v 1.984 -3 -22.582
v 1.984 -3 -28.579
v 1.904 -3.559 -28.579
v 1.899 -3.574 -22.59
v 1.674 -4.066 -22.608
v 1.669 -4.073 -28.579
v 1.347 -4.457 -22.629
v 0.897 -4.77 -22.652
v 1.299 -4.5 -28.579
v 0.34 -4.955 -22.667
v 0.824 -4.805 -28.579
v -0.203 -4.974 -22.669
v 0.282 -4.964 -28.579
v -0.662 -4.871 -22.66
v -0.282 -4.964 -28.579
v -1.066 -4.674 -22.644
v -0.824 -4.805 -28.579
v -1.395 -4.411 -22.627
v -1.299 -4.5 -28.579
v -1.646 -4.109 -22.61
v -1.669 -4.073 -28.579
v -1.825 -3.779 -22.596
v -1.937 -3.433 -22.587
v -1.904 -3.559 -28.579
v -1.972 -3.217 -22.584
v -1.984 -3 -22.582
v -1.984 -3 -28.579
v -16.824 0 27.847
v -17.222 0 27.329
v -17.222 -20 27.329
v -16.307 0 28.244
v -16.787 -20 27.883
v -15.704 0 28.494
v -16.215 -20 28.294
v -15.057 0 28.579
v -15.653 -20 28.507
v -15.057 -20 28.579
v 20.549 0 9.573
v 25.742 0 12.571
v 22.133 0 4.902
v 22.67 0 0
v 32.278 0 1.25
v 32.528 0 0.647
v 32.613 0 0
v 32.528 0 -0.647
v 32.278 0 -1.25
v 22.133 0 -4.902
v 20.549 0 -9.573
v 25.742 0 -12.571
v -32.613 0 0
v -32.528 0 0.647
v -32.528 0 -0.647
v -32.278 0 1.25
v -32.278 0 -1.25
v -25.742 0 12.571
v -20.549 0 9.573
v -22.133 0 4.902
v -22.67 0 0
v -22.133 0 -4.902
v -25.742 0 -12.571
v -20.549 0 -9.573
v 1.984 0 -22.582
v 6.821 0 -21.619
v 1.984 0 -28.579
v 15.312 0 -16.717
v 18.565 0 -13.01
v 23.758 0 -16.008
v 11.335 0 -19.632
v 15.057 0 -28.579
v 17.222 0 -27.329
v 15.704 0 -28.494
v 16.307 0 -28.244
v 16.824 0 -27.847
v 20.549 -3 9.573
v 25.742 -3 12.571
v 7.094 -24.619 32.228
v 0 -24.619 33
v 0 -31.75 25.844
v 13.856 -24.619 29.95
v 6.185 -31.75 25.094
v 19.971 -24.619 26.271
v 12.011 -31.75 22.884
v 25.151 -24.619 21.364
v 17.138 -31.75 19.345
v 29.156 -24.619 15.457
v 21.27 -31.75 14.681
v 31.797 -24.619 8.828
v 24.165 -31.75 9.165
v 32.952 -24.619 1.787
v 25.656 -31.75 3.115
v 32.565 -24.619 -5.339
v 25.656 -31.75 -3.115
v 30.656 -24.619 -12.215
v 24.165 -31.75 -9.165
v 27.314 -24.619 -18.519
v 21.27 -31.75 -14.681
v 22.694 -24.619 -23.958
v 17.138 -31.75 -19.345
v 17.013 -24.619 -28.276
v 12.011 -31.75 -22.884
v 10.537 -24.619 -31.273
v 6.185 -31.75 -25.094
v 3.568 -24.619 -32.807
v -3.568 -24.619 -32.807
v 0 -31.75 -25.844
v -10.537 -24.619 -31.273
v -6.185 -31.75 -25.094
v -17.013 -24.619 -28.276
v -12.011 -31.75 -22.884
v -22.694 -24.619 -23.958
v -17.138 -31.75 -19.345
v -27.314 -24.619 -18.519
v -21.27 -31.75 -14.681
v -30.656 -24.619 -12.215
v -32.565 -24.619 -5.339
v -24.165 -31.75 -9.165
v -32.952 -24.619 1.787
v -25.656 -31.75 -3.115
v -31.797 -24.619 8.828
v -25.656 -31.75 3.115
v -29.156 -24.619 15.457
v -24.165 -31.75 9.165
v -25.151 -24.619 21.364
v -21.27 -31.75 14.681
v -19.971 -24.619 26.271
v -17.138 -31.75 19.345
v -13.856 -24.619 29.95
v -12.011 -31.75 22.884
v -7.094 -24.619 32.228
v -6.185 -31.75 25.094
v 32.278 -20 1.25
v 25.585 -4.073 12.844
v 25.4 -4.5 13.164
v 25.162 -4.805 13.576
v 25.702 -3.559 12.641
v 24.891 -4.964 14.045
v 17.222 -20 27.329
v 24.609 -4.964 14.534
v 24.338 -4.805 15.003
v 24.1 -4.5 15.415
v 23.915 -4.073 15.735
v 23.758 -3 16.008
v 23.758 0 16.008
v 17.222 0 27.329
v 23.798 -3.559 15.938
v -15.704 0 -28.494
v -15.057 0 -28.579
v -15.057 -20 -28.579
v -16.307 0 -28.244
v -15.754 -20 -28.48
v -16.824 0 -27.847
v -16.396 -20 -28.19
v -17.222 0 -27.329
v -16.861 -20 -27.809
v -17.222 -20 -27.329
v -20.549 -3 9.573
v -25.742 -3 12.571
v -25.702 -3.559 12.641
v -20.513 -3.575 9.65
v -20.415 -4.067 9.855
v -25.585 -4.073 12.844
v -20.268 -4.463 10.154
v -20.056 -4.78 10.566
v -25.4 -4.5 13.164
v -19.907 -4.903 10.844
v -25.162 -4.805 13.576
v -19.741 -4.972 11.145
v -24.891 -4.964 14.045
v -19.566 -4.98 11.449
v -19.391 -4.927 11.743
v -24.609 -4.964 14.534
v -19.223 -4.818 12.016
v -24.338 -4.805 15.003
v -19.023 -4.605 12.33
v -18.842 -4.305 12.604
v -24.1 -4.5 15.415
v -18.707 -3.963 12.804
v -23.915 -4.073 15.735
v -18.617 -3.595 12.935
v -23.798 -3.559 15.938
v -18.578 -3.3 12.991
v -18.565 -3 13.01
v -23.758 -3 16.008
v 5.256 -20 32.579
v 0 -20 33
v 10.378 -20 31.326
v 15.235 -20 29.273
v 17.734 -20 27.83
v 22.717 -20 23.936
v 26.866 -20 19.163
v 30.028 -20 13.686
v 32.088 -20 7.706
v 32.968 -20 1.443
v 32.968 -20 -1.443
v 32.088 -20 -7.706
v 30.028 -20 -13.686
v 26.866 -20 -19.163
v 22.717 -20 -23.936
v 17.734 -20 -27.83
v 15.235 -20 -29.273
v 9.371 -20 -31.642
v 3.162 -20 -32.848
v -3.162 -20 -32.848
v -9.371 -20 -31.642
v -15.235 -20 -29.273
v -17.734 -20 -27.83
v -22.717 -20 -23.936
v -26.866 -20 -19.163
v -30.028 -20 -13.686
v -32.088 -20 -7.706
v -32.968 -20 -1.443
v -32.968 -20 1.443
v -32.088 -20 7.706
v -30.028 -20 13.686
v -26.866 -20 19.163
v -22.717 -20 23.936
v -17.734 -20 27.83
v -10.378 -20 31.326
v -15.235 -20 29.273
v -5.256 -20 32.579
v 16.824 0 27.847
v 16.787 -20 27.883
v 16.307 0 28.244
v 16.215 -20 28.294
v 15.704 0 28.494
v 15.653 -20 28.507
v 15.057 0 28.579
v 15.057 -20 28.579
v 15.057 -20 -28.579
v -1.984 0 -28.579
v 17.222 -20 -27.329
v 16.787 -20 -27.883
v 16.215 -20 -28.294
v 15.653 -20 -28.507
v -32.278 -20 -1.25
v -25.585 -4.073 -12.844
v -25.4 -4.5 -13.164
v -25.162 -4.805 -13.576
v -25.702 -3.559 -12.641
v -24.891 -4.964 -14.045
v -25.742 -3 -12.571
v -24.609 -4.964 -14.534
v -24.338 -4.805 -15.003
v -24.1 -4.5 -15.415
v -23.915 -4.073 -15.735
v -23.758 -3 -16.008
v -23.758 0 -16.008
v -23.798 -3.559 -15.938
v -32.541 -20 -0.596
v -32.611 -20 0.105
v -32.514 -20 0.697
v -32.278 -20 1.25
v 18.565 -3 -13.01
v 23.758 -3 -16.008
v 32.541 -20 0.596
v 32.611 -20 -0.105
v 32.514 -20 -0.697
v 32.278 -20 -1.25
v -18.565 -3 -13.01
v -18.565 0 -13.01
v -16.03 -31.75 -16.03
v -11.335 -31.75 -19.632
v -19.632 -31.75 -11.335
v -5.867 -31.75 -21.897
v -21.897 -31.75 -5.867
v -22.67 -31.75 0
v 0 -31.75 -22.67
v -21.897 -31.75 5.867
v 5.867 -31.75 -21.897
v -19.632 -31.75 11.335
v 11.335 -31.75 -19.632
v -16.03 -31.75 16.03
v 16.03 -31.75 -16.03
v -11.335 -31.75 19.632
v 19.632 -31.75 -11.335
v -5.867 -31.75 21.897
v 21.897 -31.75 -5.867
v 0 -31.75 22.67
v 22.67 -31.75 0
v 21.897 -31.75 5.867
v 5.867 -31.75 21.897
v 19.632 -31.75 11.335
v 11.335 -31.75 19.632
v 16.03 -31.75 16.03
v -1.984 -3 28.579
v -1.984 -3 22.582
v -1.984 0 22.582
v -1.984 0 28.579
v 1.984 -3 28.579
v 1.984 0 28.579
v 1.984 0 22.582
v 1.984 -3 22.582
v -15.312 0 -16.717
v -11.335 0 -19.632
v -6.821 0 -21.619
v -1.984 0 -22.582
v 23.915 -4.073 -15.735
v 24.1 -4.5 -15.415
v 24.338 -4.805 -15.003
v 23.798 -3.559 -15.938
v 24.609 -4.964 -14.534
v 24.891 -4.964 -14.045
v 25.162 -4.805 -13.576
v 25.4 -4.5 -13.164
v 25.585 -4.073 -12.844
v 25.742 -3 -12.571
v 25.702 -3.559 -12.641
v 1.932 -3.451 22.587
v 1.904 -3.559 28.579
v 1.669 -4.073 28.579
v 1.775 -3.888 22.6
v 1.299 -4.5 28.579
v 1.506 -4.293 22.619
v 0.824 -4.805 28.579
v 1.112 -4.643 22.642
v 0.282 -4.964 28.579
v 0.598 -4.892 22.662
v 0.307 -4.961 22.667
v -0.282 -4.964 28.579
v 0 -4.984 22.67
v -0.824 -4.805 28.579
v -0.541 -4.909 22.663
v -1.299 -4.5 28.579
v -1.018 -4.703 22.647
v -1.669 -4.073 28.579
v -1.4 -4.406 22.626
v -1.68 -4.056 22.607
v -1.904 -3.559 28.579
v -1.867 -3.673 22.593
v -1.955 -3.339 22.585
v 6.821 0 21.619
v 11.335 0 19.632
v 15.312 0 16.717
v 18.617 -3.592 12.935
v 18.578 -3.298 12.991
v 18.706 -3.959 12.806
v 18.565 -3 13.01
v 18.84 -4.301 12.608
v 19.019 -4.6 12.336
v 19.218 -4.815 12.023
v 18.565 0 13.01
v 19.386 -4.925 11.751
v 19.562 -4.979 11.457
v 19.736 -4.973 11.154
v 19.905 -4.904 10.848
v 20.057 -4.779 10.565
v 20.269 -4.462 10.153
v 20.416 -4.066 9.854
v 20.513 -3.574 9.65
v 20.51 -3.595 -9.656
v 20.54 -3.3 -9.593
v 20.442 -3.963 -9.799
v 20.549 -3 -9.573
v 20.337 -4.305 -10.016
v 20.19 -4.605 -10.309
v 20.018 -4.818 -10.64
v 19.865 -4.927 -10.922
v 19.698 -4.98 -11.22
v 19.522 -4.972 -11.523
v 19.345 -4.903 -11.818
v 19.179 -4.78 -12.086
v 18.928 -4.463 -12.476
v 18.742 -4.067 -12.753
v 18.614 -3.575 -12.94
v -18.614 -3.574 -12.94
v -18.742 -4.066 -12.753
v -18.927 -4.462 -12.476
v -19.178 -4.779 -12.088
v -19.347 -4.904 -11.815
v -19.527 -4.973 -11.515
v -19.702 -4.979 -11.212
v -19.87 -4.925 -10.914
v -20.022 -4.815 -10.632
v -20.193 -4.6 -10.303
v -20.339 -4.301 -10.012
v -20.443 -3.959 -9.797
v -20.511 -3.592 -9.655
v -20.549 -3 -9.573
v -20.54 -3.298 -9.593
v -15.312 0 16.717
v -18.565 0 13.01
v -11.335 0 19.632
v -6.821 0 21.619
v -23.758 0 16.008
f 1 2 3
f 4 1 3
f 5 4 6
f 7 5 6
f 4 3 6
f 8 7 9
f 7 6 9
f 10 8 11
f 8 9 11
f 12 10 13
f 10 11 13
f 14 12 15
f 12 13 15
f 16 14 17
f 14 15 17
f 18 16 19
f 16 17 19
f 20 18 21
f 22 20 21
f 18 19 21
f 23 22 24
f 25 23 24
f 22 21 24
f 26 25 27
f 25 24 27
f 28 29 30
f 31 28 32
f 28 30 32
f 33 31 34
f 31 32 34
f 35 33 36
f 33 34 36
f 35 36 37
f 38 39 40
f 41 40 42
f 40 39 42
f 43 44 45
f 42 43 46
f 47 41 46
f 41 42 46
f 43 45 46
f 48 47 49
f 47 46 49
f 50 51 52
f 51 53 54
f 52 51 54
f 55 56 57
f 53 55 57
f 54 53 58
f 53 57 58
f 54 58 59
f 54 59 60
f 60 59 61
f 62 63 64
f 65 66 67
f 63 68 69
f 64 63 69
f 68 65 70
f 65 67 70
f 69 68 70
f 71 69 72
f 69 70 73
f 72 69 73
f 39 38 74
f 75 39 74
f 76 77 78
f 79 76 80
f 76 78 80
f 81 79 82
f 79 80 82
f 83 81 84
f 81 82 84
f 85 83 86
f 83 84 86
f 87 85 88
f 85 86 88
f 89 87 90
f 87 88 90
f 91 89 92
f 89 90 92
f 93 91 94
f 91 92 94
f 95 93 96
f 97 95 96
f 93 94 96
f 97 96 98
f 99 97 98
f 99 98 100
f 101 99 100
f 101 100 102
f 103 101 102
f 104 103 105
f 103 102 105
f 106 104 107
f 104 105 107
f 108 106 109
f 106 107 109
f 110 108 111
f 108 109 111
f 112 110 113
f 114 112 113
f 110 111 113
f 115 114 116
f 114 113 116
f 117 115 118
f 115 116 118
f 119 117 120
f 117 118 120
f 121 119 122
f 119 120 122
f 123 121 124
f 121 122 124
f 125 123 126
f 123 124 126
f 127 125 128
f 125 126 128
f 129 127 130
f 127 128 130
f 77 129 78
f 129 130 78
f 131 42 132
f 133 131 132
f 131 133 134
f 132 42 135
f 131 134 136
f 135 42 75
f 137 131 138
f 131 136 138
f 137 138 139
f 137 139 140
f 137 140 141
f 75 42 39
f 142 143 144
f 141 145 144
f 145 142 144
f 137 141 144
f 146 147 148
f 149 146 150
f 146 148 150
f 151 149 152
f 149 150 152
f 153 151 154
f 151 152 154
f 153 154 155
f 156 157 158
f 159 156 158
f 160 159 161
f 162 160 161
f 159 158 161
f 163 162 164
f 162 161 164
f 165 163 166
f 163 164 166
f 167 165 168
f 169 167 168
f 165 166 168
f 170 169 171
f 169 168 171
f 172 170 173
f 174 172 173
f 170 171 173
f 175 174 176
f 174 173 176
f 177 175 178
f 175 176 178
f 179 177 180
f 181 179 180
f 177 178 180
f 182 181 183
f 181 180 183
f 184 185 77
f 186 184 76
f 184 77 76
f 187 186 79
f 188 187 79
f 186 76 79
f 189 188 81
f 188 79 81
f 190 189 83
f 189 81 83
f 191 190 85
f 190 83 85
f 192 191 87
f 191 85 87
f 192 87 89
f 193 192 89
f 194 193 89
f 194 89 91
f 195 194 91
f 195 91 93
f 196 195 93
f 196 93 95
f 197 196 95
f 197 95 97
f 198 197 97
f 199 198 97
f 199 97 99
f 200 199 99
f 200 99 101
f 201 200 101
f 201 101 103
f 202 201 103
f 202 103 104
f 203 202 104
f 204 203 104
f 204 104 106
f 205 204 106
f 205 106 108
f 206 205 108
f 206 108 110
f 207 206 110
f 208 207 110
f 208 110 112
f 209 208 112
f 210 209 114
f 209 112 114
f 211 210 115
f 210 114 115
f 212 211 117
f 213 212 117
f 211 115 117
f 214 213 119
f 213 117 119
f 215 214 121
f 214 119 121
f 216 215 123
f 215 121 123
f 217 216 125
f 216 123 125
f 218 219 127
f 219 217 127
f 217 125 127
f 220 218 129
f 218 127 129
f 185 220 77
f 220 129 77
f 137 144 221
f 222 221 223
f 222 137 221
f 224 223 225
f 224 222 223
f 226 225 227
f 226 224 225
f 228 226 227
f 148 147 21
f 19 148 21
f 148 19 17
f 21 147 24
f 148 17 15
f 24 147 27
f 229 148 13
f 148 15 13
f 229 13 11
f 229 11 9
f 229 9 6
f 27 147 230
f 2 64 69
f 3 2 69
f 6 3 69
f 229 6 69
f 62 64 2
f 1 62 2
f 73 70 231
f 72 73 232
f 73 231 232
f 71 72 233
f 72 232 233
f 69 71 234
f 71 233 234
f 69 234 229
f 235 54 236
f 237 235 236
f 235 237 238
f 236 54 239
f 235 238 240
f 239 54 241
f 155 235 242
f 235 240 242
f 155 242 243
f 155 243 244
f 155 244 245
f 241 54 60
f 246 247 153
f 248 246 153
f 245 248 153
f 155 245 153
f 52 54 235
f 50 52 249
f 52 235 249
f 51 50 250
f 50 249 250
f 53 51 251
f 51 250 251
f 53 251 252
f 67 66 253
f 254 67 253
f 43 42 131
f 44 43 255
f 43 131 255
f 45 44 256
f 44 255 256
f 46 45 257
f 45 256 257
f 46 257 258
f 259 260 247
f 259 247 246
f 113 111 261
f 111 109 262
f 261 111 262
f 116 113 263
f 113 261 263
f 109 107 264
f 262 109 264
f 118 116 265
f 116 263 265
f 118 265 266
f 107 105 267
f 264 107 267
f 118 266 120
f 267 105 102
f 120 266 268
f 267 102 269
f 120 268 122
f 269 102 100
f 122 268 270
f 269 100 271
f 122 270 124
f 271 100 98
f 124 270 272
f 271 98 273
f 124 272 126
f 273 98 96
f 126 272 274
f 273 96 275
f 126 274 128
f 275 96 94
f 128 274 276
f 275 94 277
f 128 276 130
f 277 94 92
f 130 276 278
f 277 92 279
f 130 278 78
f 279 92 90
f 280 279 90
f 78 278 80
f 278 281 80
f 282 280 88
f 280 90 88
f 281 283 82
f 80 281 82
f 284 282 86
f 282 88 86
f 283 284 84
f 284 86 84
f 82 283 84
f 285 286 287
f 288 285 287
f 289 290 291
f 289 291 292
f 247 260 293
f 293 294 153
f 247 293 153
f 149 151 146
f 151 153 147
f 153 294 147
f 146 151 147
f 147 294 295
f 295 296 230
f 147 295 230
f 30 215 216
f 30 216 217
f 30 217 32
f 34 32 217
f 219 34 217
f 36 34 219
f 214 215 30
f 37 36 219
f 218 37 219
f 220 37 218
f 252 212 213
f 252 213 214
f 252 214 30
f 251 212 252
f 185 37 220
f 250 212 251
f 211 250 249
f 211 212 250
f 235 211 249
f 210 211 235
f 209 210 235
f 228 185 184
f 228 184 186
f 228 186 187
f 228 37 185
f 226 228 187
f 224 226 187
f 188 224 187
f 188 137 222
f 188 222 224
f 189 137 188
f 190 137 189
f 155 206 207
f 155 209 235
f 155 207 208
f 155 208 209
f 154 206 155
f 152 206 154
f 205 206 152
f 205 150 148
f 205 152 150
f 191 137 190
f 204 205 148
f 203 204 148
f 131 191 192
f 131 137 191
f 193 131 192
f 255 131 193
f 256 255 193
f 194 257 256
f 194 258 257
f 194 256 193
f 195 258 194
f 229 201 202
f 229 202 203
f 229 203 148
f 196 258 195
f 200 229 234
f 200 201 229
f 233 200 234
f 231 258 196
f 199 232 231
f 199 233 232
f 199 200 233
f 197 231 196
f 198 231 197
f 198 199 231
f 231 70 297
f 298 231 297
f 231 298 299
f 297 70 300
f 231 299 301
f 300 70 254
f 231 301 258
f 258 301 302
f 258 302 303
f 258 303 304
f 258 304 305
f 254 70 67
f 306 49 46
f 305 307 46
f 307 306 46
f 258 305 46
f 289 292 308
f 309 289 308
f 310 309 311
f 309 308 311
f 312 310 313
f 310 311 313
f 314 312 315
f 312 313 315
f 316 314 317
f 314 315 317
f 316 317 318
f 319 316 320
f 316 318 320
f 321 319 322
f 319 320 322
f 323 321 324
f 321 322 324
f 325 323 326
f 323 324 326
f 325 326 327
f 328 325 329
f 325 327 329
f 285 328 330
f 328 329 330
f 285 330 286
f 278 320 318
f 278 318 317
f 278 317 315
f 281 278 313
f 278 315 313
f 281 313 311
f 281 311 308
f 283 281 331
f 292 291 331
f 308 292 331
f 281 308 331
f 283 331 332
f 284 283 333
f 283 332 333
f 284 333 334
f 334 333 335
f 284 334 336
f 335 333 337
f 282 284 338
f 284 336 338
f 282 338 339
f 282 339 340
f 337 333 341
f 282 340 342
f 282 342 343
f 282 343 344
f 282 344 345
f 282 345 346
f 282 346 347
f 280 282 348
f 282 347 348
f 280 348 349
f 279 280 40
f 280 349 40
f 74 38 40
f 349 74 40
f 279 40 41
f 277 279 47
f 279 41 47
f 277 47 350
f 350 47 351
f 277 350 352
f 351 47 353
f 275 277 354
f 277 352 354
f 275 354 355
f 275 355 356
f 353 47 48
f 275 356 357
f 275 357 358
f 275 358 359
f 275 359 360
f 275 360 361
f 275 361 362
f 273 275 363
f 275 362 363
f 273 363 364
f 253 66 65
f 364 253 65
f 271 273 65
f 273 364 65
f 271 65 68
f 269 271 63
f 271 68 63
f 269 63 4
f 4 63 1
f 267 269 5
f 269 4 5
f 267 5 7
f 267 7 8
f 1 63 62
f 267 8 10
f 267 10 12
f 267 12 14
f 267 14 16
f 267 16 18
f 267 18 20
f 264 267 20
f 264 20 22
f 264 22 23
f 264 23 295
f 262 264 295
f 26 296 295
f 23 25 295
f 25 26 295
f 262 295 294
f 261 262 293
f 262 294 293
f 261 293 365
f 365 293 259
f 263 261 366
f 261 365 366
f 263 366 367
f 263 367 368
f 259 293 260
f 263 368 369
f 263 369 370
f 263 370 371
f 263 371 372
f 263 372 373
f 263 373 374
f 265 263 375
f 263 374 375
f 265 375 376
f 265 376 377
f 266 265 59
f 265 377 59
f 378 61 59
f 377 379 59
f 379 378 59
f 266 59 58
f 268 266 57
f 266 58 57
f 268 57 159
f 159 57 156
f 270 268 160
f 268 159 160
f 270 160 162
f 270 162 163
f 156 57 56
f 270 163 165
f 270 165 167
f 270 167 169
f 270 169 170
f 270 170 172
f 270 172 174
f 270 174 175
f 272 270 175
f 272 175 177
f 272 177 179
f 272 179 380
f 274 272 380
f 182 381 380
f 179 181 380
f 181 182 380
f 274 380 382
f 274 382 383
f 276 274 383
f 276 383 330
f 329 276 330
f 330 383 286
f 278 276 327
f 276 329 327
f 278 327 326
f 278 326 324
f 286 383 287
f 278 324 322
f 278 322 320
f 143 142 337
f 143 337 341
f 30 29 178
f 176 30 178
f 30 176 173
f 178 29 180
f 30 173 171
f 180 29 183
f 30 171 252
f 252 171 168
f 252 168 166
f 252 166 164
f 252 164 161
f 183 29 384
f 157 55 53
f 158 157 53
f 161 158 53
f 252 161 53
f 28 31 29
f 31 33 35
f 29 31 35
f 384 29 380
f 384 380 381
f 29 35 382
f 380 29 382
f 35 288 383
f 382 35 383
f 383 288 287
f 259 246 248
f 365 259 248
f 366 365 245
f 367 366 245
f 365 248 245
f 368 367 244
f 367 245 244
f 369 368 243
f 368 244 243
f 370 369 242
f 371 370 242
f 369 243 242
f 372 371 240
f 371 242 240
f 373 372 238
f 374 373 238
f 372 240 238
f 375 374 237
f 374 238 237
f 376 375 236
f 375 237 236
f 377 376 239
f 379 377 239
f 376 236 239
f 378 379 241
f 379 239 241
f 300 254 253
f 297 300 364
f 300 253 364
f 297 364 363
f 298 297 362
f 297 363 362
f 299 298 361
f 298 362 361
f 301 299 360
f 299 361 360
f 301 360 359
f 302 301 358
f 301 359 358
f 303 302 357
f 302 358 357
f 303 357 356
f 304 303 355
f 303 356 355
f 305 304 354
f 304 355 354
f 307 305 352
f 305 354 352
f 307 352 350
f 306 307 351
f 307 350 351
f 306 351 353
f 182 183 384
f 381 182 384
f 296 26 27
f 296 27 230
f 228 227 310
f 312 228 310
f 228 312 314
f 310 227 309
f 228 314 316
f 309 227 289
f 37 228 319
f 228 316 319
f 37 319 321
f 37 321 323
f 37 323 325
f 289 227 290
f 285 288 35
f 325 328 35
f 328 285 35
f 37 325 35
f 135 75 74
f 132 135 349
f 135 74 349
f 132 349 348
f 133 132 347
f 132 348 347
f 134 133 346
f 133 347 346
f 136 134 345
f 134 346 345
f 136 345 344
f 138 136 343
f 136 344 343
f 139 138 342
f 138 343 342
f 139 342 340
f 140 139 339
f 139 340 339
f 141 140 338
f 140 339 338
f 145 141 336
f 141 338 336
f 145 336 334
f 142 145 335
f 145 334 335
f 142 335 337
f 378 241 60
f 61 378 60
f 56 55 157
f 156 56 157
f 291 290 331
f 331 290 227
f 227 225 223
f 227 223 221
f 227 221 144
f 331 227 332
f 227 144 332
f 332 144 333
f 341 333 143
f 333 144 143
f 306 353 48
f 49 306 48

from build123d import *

# Parameters (mm, degrees)
CUT_EXTRUDE5_DEPTH = 20
FILLET4_R          = 2.5
CUT_EXTRUDE6_START = -62.5788381
CUT_EXTRUDE6_DEPTH = 96.5788382
CIRPATTERN2_COUNT  = 6


with BuildPart() as part:
    # Sketch1 → Revolve1 (revolve)
    with BuildSketch(Plane(origin=(0, 0, 0), x_dir=(0, 0, -1), z_dir=(1, 0, 0))):
        Polygon((-22.6695, -31.75), (-22.6695, 0), (-33, 0), (-33, -24.619433914), (-25.8445, -31.75), align=None)
    revolve(axis=Axis((0, 0, 0), (0, 1, 0)))

    # Sketch4 → Cut-Extrude5 (cut)
    with BuildSketch(Plane(origin=(0, 0, 0), x_dir=(1, 0, 0), z_dir=(0, 1, 0))):
        with BuildLine():
            ThreePointArc((33, 0), (28.578838325, 16.5), (16.5, 28.578838325))
            Line((16.5, 28.578838325), (33, 0))
        make_face()
        with BuildLine():
            Line((-16.5, 28.578838325), (16.5, 28.578838325))
            ThreePointArc((16.5, 28.578838325), (0, 33), (-16.5, 28.578838325))
        make_face()
        with BuildLine():
            Line((-33, 0), (-16.5, 28.578838325))
            ThreePointArc((-16.5, 28.578838325), (-28.578838325, 16.5), (-33, 0))
        make_face()
        with BuildLine():
            ThreePointArc((16.5, -28.578838325), (28.578838325, -16.5), (33, 0))
            Line((33, 0), (16.5, -28.578838325))
        make_face()
        with BuildLine():
            Line((-16.5, -28.578838325), (-33, 0))
            ThreePointArc((-33, 0), (-28.578838325, -16.5), (-16.5, -28.578838325))
        make_face()
        with BuildLine():
            ThreePointArc((-16.5, -28.578838325), (0, -33), (16.5, -28.578838325))
            Line((16.5, -28.578838325), (-16.5, -28.578838325))
        make_face()
    extrude(amount=-CUT_EXTRUDE5_DEPTH, mode=Mode.SUBTRACT)

    # Fillet4
    fillet4_edges = [part.edges().sort_by_distance(p)[0] for p in [
        (33, -10, 0),
        (16.5, -10, -28.578838325),
        (-33, -10, 0),
        (16.5, -10, 28.578838325),
        (-16.5, -10, -28.578838325),
        (-16.5, -10, 28.578838325),
    ]]
    fillet(fillet4_edges, radius=FILLET4_R)

    # Sketch7 → Cut-Extrude6 (cut)
    with BuildSketch(Plane.XY.offset(CUT_EXTRUDE6_START)):
        with BuildLine():
            Line((-1.984375, -3), (-1.984375, 0))
            Line((-1.984375, 0), (1.984375, 0))
            Line((1.984375, 0), (1.984375, -3))
            ThreePointArc((1.984375, -3), (0, -4.984375), (-1.984375, -3))
        make_face()
    cut_extrude6 = extrude(amount=CUT_EXTRUDE6_DEPTH, mode=Mode.SUBTRACT)

    # CirPattern2: Cut-Extrude6 ×6 about axis
    cirpattern2_axis = Axis((0, 0, 0), (0, 1, 0))
    for i in range(1, CIRPATTERN2_COUNT):
        add(cut_extrude6.rotate(cirpattern2_axis, i * 360 / CIRPATTERN2_COUNT), mode=Mode.SUBTRACT)


solid = part.part
